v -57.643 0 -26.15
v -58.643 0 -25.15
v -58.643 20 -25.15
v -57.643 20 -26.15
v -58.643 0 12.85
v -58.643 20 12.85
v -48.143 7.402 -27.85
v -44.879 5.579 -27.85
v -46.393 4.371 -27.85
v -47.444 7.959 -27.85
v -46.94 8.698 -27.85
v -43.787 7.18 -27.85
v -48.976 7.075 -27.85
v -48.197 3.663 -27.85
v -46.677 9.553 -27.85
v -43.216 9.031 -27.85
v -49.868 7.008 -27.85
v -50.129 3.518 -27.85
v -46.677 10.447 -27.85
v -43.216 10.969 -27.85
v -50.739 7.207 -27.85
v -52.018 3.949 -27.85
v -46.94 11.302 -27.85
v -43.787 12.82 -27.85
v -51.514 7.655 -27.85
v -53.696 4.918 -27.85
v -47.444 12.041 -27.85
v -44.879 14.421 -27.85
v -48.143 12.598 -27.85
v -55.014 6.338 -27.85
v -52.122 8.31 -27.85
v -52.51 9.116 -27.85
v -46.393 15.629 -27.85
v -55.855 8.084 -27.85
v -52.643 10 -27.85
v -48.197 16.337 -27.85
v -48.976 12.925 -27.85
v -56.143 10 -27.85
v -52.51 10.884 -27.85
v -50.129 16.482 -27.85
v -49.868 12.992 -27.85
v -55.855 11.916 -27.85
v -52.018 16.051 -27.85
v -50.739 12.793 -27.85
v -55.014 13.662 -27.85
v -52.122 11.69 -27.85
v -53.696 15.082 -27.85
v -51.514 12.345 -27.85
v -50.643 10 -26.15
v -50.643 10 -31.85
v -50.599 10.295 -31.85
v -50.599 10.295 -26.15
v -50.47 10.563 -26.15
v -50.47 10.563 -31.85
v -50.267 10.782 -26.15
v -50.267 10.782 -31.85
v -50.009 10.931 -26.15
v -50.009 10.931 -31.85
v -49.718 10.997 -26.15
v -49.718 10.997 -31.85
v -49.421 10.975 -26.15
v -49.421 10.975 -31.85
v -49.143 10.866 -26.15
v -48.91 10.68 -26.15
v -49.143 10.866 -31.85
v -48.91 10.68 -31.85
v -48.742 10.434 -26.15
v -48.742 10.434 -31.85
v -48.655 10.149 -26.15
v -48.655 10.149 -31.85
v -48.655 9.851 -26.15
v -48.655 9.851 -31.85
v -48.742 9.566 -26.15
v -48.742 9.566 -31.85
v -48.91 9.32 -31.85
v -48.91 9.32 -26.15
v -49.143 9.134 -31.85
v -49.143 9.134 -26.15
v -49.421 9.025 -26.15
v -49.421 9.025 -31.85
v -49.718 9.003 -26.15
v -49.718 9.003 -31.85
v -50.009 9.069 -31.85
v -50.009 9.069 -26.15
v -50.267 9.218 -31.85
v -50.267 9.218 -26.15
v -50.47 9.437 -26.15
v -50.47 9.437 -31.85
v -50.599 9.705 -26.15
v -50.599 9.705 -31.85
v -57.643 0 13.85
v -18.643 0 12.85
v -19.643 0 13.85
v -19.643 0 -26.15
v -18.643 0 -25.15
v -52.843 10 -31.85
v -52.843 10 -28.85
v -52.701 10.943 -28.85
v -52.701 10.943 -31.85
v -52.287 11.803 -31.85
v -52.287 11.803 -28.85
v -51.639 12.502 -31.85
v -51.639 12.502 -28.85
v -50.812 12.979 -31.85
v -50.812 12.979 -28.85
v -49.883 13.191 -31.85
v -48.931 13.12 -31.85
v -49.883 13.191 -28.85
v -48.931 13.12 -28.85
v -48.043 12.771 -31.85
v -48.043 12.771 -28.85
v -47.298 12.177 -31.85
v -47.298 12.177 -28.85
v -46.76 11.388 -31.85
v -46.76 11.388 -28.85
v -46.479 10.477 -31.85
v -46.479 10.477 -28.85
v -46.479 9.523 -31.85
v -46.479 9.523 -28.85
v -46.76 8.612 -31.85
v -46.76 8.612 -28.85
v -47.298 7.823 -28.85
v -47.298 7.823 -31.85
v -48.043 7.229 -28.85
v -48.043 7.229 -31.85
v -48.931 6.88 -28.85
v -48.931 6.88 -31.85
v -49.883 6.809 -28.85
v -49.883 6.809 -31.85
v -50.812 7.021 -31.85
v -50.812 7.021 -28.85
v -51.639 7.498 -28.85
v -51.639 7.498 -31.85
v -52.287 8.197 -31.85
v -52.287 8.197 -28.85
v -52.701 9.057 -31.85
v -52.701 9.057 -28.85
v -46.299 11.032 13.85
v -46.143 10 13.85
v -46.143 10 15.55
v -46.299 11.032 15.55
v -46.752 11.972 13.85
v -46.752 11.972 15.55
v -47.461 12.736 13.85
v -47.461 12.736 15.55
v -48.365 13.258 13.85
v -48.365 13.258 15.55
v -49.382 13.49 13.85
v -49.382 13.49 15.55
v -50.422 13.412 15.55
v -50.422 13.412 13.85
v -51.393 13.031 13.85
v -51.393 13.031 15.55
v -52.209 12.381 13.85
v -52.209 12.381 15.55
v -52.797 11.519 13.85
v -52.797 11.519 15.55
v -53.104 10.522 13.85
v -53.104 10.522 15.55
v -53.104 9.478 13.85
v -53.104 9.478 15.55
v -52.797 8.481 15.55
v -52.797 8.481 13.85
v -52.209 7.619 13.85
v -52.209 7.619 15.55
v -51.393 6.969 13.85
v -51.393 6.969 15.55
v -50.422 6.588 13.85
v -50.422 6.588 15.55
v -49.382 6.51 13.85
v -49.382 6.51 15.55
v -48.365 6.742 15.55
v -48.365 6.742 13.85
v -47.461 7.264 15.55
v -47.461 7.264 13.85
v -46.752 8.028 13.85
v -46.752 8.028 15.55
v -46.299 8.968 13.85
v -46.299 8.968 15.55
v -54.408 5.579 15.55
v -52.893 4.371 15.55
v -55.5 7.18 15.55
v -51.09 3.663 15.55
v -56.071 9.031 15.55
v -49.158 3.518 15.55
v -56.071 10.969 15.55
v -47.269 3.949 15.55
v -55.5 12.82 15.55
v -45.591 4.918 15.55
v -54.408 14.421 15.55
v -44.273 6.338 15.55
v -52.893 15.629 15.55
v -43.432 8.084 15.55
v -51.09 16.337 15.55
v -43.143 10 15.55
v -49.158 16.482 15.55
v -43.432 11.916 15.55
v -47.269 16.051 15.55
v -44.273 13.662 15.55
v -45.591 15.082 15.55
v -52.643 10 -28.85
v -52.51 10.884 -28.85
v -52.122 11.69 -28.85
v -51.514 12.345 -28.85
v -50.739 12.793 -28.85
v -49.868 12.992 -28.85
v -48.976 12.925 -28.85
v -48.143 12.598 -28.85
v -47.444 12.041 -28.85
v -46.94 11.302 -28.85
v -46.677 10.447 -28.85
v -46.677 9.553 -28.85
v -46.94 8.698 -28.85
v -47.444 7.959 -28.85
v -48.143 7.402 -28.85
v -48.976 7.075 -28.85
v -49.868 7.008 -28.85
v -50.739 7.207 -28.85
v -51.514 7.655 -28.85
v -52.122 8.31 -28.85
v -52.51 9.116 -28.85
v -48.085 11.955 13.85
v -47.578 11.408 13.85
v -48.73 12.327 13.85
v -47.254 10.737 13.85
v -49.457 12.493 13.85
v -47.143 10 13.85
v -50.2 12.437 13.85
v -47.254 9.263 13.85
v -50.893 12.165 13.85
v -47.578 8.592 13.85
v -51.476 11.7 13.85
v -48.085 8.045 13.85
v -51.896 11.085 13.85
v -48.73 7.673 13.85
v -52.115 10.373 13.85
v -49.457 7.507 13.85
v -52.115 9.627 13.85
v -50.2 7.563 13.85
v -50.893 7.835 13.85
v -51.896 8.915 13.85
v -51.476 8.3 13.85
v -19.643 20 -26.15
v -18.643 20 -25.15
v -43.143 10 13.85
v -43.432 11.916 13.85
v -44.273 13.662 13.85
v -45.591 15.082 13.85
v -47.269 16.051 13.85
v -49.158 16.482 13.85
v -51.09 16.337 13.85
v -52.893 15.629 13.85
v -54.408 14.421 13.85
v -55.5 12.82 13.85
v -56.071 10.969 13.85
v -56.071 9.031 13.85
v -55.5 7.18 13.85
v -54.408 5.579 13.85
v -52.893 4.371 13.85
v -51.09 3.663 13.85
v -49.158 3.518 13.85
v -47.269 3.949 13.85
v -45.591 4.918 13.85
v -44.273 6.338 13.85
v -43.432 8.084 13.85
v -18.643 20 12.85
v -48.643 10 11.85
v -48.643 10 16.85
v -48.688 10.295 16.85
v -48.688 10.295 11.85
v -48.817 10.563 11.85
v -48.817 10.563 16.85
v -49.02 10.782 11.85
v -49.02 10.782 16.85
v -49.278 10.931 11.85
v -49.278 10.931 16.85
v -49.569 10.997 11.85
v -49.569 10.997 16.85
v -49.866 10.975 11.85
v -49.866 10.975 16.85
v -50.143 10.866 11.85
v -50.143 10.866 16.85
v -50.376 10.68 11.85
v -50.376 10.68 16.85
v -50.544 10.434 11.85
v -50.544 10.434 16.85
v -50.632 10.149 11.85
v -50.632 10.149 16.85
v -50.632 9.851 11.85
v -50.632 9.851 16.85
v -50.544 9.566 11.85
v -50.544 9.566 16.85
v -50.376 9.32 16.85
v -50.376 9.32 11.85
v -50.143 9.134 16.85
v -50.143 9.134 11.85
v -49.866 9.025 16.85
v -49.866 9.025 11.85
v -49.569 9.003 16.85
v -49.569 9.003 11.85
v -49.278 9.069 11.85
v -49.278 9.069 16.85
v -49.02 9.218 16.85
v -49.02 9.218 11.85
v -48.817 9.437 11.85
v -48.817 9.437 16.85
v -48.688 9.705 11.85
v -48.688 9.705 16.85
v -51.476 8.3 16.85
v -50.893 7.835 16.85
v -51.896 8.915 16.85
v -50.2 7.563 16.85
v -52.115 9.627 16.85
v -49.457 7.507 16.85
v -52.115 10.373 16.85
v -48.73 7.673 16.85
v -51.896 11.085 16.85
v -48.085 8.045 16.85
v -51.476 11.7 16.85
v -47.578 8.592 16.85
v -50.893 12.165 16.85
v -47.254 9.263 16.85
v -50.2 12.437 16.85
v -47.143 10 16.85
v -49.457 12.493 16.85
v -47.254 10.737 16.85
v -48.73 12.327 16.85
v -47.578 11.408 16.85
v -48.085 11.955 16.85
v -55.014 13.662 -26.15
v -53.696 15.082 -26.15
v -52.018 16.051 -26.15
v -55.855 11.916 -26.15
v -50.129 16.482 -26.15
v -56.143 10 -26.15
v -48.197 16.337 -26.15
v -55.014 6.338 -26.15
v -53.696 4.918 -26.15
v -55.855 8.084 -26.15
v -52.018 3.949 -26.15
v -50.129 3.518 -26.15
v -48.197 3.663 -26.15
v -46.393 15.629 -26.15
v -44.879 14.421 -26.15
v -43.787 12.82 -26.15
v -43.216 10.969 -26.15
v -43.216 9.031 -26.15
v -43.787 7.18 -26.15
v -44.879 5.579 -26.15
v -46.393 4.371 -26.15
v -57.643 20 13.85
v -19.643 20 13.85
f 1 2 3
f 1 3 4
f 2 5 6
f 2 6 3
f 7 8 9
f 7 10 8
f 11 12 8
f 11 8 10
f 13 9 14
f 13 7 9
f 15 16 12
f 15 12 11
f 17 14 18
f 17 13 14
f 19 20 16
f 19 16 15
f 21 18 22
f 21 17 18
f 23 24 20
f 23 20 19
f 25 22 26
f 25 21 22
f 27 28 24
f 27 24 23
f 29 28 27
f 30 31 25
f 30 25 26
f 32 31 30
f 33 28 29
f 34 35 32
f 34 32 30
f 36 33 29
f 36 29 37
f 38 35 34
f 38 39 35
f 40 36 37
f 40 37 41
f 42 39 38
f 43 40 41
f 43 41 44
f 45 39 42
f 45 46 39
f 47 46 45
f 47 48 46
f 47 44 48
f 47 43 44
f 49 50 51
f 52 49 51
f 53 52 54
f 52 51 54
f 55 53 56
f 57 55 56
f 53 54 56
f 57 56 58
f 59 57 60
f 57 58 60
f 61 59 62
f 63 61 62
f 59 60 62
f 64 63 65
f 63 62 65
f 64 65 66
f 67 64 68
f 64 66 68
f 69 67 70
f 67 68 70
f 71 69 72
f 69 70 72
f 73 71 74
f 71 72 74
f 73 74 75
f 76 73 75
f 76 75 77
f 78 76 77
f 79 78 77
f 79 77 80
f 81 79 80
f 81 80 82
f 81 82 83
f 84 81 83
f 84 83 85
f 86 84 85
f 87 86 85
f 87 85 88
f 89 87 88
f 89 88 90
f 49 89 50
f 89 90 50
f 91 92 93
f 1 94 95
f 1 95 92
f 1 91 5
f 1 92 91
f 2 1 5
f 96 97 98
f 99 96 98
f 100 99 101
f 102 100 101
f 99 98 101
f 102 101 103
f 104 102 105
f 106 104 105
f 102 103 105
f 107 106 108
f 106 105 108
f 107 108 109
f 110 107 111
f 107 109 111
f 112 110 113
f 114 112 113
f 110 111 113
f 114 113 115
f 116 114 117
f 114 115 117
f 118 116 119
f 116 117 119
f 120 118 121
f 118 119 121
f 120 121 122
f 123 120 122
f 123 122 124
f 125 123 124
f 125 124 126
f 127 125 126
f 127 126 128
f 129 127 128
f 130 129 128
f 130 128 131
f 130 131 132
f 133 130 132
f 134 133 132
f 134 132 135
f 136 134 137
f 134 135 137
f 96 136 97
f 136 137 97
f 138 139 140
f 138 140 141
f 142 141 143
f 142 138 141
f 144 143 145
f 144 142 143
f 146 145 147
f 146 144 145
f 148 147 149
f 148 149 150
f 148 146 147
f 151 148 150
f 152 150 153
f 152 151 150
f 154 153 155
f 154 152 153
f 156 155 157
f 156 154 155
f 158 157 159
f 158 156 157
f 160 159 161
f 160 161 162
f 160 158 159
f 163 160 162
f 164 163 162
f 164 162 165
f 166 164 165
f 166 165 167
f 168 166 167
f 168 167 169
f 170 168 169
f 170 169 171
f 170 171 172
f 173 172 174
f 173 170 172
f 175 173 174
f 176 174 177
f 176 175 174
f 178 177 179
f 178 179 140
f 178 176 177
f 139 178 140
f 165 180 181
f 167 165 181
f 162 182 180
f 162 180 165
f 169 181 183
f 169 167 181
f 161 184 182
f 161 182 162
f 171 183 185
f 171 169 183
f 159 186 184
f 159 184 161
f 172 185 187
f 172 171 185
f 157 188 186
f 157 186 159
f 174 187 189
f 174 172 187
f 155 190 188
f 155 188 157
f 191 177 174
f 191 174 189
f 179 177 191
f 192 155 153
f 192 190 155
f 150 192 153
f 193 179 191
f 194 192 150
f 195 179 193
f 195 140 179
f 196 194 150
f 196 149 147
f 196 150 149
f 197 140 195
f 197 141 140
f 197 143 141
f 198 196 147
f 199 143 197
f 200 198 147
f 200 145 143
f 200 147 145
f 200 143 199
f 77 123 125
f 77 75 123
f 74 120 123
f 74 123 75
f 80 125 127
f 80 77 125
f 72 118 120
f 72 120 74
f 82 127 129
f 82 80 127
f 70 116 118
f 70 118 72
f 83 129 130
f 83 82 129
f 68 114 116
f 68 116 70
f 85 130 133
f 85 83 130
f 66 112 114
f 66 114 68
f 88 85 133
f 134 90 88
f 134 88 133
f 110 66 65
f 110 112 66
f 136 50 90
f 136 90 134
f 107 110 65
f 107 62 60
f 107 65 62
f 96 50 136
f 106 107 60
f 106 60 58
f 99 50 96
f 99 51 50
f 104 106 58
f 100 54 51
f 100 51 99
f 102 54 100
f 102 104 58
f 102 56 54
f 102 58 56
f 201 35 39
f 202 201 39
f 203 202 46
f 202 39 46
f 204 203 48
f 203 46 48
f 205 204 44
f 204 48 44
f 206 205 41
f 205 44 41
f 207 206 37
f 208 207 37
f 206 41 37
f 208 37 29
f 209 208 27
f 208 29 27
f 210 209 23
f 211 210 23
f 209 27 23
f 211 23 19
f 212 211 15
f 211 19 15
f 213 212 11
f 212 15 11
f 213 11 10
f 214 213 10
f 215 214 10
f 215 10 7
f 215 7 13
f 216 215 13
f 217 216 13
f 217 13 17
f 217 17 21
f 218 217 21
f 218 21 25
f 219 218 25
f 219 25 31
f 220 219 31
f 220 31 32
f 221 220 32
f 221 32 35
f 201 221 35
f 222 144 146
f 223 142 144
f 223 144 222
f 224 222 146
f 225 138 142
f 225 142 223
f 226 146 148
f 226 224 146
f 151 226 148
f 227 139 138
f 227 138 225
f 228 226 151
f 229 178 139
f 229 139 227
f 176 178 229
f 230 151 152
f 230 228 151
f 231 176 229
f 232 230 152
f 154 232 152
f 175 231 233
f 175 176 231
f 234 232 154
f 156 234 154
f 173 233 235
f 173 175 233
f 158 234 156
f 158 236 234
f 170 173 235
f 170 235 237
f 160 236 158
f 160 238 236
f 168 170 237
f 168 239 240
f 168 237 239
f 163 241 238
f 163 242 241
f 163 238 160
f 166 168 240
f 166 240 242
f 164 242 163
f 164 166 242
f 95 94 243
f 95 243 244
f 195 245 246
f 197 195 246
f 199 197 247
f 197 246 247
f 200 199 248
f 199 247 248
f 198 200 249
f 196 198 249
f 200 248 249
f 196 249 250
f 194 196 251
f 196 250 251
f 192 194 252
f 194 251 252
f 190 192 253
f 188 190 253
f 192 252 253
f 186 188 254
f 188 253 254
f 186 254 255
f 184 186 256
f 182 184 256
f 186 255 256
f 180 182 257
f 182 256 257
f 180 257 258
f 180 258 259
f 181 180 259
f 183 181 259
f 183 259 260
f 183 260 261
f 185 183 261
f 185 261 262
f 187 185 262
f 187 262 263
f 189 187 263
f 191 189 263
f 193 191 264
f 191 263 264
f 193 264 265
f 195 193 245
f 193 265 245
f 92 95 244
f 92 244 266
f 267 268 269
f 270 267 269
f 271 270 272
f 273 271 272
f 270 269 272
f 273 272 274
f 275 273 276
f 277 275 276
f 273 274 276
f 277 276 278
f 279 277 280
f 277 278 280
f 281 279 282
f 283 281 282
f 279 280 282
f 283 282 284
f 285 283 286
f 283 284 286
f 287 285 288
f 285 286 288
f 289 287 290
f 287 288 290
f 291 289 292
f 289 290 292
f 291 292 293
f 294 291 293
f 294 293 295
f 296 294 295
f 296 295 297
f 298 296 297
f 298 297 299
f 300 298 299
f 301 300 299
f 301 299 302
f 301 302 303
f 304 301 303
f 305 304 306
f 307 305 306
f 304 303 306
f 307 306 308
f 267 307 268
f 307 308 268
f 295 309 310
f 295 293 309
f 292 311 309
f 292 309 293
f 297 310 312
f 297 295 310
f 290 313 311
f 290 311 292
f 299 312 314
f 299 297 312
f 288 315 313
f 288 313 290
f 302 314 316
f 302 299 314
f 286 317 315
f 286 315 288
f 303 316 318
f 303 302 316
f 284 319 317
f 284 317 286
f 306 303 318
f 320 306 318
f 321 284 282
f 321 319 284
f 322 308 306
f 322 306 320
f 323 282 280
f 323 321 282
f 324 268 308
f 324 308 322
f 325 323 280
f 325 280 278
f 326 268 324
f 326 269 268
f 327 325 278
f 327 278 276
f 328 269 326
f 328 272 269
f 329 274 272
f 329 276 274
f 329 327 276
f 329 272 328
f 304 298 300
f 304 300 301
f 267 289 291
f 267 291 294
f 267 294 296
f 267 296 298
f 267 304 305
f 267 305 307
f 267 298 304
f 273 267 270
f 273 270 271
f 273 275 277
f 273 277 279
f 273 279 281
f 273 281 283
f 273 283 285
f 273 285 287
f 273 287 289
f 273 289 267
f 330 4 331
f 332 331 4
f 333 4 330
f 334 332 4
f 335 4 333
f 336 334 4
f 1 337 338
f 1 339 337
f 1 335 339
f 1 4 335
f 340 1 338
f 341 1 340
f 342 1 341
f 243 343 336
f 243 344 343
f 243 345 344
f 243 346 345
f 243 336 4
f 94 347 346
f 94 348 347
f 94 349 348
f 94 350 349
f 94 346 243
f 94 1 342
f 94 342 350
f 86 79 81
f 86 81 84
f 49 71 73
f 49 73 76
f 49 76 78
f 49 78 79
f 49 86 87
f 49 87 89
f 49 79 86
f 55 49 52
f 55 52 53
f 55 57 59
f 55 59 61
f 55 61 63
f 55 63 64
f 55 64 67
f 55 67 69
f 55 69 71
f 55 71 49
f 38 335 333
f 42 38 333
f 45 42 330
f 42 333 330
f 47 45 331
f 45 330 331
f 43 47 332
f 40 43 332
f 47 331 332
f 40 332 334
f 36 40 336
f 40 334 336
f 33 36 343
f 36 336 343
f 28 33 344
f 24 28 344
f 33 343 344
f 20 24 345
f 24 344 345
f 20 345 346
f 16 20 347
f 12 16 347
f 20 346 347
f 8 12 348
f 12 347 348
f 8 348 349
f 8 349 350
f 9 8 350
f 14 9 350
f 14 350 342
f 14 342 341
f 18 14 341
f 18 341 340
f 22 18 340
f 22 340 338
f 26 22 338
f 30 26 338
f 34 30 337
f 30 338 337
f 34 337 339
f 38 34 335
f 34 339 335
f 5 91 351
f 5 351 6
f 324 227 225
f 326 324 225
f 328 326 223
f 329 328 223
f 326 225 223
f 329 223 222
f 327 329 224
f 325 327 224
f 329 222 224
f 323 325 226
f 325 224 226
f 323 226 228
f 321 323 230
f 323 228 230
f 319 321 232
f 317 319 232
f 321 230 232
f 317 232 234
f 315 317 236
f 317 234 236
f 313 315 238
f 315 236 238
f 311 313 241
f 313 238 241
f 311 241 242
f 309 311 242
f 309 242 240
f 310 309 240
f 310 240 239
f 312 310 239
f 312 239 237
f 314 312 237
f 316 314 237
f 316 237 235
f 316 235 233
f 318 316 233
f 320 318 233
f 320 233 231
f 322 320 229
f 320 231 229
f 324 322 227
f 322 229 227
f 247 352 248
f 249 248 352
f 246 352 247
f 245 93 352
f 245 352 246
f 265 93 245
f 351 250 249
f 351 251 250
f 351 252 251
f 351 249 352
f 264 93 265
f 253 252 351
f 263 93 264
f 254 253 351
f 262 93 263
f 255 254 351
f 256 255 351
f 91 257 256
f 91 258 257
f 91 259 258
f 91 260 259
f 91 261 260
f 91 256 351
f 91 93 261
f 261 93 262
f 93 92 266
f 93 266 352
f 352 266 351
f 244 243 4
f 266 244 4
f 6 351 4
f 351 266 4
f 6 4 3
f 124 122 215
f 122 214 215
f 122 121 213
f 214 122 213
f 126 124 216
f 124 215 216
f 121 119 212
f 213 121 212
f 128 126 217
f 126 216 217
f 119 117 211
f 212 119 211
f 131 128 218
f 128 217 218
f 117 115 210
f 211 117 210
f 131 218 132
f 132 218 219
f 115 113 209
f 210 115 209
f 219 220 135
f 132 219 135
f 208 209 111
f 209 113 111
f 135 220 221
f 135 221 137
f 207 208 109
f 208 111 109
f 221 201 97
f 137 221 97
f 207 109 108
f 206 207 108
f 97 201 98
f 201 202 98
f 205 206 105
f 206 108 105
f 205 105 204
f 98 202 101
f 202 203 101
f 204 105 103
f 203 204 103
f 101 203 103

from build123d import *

# Parameters (mm, degrees)
EXTRUDE_1_DEPTH      = 20
SKETCH_4_R           = 6.5
SKETCH_4_R_2         = 3
EXTRUDE_2_DEPTH      = 1.7
SKETCH_5_R           = 3
EXTRUDE_3_DEPTH      = 2.7
SKETCH_6_R           = 3.2
EXTRUDE_4_DEPTH      = 3
SKETCH_7_R           = 1
CUT_EXTRUDE_41_DEPTH = 5.7
SKETCH_8_R           = 6.5
SKETCH_8_R_2         = 3.5
EXTRUDE_5_DEPTH      = 1.7
SKETCH_9_R           = 2.5
EXTRUDE_6_DEPTH      = 3
SKETCH_10_R          = 1
CUT_EXTRUDE_42_DEPTH = 5


with BuildPart() as part:
    # 草图1 → 凸台-拉伸1 (new body)
    with BuildSketch(Plane(origin=(0, 0, 0), x_dir=(1, 0, 0), z_dir=(0, 1, 0))):
        Polygon((-57.643399256, 26.149695183), (-19.643399256, 26.149695183), (-18.643399256, 25.149695183), (-18.643399256, -12.850304817), (-19.643399256, -13.850304817), (-57.643399256, -13.850304817), (-58.643399256, -12.850304817), (-58.643399256, 25.149695183), align=None)
    extrude(amount=EXTRUDE_1_DEPTH)

    # 草图4 → 凸台-拉伸2 (add)
    with BuildSketch(Plane(origin=(0, 0, -26.149695183), x_dir=(-1, 0, 0), z_dir=(0, 0, -1))):
        with Locations((49.643399256, 10)):
            Circle(SKETCH_4_R)
        with Locations((49.643399256, 10)):
            Circle(SKETCH_4_R_2, mode=Mode.SUBTRACT)
    extrude(amount=EXTRUDE_2_DEPTH)

    # 草图5 → 凸台-拉伸3 (add)
    with BuildSketch(Plane(origin=(0, 0, -26.149695183), x_dir=(-1, 0, 0), z_dir=(0, 0, -1))):
        with Locations((49.643399256, 10)):
            Circle(SKETCH_5_R)
    extrude(amount=EXTRUDE_3_DEPTH)

    # 草图6 → 凸台-拉伸4 (add)
    with BuildSketch(Plane(origin=(0, 0, -28.849695183), x_dir=(-1, 0, 0), z_dir=(0, 0, -1))):
        with Locations((49.643399256, 10)):
            Circle(SKETCH_6_R)
    extrude(amount=EXTRUDE_4_DEPTH)

    # 草图7 → 切除-拉伸41 (cut)
    with BuildSketch(Plane(origin=(0, 0, -31.849695183), x_dir=(-1, 0, 0), z_dir=(0, 0, -1))):
        with Locations((49.643399256, 10)):
            Circle(SKETCH_7_R)
    extrude(amount=-CUT_EXTRUDE_41_DEPTH, mode=Mode.SUBTRACT)

    # 草图8 → 凸台-拉伸5 (add)
    with BuildSketch(Plane.XY.offset(13.850304817)):
        with Locations((-49.643399256, 10)):
            Circle(SKETCH_8_R)
        with Locations((-49.643399256, 10)):
            Circle(SKETCH_8_R_2, mode=Mode.SUBTRACT)
    extrude(amount=EXTRUDE_5_DEPTH)

    # 草图9 → 凸台-拉伸6 (add)
    with BuildSketch(Plane.XY.offset(13.850304817)):
        with Locations((-49.643399256, 10)):
            Circle(SKETCH_9_R)
    extrude(amount=EXTRUDE_6_DEPTH)

    # 草图10 → 切除-拉伸42 (cut)
    with BuildSketch(Plane.XY.offset(16.850304817)):
        with Locations((-49.643399256, 10)):
            Circle(SKETCH_10_R)
    extrude(amount=-CUT_EXTRUDE_42_DEPTH, mode=Mode.SUBTRACT)


solid = part.part
